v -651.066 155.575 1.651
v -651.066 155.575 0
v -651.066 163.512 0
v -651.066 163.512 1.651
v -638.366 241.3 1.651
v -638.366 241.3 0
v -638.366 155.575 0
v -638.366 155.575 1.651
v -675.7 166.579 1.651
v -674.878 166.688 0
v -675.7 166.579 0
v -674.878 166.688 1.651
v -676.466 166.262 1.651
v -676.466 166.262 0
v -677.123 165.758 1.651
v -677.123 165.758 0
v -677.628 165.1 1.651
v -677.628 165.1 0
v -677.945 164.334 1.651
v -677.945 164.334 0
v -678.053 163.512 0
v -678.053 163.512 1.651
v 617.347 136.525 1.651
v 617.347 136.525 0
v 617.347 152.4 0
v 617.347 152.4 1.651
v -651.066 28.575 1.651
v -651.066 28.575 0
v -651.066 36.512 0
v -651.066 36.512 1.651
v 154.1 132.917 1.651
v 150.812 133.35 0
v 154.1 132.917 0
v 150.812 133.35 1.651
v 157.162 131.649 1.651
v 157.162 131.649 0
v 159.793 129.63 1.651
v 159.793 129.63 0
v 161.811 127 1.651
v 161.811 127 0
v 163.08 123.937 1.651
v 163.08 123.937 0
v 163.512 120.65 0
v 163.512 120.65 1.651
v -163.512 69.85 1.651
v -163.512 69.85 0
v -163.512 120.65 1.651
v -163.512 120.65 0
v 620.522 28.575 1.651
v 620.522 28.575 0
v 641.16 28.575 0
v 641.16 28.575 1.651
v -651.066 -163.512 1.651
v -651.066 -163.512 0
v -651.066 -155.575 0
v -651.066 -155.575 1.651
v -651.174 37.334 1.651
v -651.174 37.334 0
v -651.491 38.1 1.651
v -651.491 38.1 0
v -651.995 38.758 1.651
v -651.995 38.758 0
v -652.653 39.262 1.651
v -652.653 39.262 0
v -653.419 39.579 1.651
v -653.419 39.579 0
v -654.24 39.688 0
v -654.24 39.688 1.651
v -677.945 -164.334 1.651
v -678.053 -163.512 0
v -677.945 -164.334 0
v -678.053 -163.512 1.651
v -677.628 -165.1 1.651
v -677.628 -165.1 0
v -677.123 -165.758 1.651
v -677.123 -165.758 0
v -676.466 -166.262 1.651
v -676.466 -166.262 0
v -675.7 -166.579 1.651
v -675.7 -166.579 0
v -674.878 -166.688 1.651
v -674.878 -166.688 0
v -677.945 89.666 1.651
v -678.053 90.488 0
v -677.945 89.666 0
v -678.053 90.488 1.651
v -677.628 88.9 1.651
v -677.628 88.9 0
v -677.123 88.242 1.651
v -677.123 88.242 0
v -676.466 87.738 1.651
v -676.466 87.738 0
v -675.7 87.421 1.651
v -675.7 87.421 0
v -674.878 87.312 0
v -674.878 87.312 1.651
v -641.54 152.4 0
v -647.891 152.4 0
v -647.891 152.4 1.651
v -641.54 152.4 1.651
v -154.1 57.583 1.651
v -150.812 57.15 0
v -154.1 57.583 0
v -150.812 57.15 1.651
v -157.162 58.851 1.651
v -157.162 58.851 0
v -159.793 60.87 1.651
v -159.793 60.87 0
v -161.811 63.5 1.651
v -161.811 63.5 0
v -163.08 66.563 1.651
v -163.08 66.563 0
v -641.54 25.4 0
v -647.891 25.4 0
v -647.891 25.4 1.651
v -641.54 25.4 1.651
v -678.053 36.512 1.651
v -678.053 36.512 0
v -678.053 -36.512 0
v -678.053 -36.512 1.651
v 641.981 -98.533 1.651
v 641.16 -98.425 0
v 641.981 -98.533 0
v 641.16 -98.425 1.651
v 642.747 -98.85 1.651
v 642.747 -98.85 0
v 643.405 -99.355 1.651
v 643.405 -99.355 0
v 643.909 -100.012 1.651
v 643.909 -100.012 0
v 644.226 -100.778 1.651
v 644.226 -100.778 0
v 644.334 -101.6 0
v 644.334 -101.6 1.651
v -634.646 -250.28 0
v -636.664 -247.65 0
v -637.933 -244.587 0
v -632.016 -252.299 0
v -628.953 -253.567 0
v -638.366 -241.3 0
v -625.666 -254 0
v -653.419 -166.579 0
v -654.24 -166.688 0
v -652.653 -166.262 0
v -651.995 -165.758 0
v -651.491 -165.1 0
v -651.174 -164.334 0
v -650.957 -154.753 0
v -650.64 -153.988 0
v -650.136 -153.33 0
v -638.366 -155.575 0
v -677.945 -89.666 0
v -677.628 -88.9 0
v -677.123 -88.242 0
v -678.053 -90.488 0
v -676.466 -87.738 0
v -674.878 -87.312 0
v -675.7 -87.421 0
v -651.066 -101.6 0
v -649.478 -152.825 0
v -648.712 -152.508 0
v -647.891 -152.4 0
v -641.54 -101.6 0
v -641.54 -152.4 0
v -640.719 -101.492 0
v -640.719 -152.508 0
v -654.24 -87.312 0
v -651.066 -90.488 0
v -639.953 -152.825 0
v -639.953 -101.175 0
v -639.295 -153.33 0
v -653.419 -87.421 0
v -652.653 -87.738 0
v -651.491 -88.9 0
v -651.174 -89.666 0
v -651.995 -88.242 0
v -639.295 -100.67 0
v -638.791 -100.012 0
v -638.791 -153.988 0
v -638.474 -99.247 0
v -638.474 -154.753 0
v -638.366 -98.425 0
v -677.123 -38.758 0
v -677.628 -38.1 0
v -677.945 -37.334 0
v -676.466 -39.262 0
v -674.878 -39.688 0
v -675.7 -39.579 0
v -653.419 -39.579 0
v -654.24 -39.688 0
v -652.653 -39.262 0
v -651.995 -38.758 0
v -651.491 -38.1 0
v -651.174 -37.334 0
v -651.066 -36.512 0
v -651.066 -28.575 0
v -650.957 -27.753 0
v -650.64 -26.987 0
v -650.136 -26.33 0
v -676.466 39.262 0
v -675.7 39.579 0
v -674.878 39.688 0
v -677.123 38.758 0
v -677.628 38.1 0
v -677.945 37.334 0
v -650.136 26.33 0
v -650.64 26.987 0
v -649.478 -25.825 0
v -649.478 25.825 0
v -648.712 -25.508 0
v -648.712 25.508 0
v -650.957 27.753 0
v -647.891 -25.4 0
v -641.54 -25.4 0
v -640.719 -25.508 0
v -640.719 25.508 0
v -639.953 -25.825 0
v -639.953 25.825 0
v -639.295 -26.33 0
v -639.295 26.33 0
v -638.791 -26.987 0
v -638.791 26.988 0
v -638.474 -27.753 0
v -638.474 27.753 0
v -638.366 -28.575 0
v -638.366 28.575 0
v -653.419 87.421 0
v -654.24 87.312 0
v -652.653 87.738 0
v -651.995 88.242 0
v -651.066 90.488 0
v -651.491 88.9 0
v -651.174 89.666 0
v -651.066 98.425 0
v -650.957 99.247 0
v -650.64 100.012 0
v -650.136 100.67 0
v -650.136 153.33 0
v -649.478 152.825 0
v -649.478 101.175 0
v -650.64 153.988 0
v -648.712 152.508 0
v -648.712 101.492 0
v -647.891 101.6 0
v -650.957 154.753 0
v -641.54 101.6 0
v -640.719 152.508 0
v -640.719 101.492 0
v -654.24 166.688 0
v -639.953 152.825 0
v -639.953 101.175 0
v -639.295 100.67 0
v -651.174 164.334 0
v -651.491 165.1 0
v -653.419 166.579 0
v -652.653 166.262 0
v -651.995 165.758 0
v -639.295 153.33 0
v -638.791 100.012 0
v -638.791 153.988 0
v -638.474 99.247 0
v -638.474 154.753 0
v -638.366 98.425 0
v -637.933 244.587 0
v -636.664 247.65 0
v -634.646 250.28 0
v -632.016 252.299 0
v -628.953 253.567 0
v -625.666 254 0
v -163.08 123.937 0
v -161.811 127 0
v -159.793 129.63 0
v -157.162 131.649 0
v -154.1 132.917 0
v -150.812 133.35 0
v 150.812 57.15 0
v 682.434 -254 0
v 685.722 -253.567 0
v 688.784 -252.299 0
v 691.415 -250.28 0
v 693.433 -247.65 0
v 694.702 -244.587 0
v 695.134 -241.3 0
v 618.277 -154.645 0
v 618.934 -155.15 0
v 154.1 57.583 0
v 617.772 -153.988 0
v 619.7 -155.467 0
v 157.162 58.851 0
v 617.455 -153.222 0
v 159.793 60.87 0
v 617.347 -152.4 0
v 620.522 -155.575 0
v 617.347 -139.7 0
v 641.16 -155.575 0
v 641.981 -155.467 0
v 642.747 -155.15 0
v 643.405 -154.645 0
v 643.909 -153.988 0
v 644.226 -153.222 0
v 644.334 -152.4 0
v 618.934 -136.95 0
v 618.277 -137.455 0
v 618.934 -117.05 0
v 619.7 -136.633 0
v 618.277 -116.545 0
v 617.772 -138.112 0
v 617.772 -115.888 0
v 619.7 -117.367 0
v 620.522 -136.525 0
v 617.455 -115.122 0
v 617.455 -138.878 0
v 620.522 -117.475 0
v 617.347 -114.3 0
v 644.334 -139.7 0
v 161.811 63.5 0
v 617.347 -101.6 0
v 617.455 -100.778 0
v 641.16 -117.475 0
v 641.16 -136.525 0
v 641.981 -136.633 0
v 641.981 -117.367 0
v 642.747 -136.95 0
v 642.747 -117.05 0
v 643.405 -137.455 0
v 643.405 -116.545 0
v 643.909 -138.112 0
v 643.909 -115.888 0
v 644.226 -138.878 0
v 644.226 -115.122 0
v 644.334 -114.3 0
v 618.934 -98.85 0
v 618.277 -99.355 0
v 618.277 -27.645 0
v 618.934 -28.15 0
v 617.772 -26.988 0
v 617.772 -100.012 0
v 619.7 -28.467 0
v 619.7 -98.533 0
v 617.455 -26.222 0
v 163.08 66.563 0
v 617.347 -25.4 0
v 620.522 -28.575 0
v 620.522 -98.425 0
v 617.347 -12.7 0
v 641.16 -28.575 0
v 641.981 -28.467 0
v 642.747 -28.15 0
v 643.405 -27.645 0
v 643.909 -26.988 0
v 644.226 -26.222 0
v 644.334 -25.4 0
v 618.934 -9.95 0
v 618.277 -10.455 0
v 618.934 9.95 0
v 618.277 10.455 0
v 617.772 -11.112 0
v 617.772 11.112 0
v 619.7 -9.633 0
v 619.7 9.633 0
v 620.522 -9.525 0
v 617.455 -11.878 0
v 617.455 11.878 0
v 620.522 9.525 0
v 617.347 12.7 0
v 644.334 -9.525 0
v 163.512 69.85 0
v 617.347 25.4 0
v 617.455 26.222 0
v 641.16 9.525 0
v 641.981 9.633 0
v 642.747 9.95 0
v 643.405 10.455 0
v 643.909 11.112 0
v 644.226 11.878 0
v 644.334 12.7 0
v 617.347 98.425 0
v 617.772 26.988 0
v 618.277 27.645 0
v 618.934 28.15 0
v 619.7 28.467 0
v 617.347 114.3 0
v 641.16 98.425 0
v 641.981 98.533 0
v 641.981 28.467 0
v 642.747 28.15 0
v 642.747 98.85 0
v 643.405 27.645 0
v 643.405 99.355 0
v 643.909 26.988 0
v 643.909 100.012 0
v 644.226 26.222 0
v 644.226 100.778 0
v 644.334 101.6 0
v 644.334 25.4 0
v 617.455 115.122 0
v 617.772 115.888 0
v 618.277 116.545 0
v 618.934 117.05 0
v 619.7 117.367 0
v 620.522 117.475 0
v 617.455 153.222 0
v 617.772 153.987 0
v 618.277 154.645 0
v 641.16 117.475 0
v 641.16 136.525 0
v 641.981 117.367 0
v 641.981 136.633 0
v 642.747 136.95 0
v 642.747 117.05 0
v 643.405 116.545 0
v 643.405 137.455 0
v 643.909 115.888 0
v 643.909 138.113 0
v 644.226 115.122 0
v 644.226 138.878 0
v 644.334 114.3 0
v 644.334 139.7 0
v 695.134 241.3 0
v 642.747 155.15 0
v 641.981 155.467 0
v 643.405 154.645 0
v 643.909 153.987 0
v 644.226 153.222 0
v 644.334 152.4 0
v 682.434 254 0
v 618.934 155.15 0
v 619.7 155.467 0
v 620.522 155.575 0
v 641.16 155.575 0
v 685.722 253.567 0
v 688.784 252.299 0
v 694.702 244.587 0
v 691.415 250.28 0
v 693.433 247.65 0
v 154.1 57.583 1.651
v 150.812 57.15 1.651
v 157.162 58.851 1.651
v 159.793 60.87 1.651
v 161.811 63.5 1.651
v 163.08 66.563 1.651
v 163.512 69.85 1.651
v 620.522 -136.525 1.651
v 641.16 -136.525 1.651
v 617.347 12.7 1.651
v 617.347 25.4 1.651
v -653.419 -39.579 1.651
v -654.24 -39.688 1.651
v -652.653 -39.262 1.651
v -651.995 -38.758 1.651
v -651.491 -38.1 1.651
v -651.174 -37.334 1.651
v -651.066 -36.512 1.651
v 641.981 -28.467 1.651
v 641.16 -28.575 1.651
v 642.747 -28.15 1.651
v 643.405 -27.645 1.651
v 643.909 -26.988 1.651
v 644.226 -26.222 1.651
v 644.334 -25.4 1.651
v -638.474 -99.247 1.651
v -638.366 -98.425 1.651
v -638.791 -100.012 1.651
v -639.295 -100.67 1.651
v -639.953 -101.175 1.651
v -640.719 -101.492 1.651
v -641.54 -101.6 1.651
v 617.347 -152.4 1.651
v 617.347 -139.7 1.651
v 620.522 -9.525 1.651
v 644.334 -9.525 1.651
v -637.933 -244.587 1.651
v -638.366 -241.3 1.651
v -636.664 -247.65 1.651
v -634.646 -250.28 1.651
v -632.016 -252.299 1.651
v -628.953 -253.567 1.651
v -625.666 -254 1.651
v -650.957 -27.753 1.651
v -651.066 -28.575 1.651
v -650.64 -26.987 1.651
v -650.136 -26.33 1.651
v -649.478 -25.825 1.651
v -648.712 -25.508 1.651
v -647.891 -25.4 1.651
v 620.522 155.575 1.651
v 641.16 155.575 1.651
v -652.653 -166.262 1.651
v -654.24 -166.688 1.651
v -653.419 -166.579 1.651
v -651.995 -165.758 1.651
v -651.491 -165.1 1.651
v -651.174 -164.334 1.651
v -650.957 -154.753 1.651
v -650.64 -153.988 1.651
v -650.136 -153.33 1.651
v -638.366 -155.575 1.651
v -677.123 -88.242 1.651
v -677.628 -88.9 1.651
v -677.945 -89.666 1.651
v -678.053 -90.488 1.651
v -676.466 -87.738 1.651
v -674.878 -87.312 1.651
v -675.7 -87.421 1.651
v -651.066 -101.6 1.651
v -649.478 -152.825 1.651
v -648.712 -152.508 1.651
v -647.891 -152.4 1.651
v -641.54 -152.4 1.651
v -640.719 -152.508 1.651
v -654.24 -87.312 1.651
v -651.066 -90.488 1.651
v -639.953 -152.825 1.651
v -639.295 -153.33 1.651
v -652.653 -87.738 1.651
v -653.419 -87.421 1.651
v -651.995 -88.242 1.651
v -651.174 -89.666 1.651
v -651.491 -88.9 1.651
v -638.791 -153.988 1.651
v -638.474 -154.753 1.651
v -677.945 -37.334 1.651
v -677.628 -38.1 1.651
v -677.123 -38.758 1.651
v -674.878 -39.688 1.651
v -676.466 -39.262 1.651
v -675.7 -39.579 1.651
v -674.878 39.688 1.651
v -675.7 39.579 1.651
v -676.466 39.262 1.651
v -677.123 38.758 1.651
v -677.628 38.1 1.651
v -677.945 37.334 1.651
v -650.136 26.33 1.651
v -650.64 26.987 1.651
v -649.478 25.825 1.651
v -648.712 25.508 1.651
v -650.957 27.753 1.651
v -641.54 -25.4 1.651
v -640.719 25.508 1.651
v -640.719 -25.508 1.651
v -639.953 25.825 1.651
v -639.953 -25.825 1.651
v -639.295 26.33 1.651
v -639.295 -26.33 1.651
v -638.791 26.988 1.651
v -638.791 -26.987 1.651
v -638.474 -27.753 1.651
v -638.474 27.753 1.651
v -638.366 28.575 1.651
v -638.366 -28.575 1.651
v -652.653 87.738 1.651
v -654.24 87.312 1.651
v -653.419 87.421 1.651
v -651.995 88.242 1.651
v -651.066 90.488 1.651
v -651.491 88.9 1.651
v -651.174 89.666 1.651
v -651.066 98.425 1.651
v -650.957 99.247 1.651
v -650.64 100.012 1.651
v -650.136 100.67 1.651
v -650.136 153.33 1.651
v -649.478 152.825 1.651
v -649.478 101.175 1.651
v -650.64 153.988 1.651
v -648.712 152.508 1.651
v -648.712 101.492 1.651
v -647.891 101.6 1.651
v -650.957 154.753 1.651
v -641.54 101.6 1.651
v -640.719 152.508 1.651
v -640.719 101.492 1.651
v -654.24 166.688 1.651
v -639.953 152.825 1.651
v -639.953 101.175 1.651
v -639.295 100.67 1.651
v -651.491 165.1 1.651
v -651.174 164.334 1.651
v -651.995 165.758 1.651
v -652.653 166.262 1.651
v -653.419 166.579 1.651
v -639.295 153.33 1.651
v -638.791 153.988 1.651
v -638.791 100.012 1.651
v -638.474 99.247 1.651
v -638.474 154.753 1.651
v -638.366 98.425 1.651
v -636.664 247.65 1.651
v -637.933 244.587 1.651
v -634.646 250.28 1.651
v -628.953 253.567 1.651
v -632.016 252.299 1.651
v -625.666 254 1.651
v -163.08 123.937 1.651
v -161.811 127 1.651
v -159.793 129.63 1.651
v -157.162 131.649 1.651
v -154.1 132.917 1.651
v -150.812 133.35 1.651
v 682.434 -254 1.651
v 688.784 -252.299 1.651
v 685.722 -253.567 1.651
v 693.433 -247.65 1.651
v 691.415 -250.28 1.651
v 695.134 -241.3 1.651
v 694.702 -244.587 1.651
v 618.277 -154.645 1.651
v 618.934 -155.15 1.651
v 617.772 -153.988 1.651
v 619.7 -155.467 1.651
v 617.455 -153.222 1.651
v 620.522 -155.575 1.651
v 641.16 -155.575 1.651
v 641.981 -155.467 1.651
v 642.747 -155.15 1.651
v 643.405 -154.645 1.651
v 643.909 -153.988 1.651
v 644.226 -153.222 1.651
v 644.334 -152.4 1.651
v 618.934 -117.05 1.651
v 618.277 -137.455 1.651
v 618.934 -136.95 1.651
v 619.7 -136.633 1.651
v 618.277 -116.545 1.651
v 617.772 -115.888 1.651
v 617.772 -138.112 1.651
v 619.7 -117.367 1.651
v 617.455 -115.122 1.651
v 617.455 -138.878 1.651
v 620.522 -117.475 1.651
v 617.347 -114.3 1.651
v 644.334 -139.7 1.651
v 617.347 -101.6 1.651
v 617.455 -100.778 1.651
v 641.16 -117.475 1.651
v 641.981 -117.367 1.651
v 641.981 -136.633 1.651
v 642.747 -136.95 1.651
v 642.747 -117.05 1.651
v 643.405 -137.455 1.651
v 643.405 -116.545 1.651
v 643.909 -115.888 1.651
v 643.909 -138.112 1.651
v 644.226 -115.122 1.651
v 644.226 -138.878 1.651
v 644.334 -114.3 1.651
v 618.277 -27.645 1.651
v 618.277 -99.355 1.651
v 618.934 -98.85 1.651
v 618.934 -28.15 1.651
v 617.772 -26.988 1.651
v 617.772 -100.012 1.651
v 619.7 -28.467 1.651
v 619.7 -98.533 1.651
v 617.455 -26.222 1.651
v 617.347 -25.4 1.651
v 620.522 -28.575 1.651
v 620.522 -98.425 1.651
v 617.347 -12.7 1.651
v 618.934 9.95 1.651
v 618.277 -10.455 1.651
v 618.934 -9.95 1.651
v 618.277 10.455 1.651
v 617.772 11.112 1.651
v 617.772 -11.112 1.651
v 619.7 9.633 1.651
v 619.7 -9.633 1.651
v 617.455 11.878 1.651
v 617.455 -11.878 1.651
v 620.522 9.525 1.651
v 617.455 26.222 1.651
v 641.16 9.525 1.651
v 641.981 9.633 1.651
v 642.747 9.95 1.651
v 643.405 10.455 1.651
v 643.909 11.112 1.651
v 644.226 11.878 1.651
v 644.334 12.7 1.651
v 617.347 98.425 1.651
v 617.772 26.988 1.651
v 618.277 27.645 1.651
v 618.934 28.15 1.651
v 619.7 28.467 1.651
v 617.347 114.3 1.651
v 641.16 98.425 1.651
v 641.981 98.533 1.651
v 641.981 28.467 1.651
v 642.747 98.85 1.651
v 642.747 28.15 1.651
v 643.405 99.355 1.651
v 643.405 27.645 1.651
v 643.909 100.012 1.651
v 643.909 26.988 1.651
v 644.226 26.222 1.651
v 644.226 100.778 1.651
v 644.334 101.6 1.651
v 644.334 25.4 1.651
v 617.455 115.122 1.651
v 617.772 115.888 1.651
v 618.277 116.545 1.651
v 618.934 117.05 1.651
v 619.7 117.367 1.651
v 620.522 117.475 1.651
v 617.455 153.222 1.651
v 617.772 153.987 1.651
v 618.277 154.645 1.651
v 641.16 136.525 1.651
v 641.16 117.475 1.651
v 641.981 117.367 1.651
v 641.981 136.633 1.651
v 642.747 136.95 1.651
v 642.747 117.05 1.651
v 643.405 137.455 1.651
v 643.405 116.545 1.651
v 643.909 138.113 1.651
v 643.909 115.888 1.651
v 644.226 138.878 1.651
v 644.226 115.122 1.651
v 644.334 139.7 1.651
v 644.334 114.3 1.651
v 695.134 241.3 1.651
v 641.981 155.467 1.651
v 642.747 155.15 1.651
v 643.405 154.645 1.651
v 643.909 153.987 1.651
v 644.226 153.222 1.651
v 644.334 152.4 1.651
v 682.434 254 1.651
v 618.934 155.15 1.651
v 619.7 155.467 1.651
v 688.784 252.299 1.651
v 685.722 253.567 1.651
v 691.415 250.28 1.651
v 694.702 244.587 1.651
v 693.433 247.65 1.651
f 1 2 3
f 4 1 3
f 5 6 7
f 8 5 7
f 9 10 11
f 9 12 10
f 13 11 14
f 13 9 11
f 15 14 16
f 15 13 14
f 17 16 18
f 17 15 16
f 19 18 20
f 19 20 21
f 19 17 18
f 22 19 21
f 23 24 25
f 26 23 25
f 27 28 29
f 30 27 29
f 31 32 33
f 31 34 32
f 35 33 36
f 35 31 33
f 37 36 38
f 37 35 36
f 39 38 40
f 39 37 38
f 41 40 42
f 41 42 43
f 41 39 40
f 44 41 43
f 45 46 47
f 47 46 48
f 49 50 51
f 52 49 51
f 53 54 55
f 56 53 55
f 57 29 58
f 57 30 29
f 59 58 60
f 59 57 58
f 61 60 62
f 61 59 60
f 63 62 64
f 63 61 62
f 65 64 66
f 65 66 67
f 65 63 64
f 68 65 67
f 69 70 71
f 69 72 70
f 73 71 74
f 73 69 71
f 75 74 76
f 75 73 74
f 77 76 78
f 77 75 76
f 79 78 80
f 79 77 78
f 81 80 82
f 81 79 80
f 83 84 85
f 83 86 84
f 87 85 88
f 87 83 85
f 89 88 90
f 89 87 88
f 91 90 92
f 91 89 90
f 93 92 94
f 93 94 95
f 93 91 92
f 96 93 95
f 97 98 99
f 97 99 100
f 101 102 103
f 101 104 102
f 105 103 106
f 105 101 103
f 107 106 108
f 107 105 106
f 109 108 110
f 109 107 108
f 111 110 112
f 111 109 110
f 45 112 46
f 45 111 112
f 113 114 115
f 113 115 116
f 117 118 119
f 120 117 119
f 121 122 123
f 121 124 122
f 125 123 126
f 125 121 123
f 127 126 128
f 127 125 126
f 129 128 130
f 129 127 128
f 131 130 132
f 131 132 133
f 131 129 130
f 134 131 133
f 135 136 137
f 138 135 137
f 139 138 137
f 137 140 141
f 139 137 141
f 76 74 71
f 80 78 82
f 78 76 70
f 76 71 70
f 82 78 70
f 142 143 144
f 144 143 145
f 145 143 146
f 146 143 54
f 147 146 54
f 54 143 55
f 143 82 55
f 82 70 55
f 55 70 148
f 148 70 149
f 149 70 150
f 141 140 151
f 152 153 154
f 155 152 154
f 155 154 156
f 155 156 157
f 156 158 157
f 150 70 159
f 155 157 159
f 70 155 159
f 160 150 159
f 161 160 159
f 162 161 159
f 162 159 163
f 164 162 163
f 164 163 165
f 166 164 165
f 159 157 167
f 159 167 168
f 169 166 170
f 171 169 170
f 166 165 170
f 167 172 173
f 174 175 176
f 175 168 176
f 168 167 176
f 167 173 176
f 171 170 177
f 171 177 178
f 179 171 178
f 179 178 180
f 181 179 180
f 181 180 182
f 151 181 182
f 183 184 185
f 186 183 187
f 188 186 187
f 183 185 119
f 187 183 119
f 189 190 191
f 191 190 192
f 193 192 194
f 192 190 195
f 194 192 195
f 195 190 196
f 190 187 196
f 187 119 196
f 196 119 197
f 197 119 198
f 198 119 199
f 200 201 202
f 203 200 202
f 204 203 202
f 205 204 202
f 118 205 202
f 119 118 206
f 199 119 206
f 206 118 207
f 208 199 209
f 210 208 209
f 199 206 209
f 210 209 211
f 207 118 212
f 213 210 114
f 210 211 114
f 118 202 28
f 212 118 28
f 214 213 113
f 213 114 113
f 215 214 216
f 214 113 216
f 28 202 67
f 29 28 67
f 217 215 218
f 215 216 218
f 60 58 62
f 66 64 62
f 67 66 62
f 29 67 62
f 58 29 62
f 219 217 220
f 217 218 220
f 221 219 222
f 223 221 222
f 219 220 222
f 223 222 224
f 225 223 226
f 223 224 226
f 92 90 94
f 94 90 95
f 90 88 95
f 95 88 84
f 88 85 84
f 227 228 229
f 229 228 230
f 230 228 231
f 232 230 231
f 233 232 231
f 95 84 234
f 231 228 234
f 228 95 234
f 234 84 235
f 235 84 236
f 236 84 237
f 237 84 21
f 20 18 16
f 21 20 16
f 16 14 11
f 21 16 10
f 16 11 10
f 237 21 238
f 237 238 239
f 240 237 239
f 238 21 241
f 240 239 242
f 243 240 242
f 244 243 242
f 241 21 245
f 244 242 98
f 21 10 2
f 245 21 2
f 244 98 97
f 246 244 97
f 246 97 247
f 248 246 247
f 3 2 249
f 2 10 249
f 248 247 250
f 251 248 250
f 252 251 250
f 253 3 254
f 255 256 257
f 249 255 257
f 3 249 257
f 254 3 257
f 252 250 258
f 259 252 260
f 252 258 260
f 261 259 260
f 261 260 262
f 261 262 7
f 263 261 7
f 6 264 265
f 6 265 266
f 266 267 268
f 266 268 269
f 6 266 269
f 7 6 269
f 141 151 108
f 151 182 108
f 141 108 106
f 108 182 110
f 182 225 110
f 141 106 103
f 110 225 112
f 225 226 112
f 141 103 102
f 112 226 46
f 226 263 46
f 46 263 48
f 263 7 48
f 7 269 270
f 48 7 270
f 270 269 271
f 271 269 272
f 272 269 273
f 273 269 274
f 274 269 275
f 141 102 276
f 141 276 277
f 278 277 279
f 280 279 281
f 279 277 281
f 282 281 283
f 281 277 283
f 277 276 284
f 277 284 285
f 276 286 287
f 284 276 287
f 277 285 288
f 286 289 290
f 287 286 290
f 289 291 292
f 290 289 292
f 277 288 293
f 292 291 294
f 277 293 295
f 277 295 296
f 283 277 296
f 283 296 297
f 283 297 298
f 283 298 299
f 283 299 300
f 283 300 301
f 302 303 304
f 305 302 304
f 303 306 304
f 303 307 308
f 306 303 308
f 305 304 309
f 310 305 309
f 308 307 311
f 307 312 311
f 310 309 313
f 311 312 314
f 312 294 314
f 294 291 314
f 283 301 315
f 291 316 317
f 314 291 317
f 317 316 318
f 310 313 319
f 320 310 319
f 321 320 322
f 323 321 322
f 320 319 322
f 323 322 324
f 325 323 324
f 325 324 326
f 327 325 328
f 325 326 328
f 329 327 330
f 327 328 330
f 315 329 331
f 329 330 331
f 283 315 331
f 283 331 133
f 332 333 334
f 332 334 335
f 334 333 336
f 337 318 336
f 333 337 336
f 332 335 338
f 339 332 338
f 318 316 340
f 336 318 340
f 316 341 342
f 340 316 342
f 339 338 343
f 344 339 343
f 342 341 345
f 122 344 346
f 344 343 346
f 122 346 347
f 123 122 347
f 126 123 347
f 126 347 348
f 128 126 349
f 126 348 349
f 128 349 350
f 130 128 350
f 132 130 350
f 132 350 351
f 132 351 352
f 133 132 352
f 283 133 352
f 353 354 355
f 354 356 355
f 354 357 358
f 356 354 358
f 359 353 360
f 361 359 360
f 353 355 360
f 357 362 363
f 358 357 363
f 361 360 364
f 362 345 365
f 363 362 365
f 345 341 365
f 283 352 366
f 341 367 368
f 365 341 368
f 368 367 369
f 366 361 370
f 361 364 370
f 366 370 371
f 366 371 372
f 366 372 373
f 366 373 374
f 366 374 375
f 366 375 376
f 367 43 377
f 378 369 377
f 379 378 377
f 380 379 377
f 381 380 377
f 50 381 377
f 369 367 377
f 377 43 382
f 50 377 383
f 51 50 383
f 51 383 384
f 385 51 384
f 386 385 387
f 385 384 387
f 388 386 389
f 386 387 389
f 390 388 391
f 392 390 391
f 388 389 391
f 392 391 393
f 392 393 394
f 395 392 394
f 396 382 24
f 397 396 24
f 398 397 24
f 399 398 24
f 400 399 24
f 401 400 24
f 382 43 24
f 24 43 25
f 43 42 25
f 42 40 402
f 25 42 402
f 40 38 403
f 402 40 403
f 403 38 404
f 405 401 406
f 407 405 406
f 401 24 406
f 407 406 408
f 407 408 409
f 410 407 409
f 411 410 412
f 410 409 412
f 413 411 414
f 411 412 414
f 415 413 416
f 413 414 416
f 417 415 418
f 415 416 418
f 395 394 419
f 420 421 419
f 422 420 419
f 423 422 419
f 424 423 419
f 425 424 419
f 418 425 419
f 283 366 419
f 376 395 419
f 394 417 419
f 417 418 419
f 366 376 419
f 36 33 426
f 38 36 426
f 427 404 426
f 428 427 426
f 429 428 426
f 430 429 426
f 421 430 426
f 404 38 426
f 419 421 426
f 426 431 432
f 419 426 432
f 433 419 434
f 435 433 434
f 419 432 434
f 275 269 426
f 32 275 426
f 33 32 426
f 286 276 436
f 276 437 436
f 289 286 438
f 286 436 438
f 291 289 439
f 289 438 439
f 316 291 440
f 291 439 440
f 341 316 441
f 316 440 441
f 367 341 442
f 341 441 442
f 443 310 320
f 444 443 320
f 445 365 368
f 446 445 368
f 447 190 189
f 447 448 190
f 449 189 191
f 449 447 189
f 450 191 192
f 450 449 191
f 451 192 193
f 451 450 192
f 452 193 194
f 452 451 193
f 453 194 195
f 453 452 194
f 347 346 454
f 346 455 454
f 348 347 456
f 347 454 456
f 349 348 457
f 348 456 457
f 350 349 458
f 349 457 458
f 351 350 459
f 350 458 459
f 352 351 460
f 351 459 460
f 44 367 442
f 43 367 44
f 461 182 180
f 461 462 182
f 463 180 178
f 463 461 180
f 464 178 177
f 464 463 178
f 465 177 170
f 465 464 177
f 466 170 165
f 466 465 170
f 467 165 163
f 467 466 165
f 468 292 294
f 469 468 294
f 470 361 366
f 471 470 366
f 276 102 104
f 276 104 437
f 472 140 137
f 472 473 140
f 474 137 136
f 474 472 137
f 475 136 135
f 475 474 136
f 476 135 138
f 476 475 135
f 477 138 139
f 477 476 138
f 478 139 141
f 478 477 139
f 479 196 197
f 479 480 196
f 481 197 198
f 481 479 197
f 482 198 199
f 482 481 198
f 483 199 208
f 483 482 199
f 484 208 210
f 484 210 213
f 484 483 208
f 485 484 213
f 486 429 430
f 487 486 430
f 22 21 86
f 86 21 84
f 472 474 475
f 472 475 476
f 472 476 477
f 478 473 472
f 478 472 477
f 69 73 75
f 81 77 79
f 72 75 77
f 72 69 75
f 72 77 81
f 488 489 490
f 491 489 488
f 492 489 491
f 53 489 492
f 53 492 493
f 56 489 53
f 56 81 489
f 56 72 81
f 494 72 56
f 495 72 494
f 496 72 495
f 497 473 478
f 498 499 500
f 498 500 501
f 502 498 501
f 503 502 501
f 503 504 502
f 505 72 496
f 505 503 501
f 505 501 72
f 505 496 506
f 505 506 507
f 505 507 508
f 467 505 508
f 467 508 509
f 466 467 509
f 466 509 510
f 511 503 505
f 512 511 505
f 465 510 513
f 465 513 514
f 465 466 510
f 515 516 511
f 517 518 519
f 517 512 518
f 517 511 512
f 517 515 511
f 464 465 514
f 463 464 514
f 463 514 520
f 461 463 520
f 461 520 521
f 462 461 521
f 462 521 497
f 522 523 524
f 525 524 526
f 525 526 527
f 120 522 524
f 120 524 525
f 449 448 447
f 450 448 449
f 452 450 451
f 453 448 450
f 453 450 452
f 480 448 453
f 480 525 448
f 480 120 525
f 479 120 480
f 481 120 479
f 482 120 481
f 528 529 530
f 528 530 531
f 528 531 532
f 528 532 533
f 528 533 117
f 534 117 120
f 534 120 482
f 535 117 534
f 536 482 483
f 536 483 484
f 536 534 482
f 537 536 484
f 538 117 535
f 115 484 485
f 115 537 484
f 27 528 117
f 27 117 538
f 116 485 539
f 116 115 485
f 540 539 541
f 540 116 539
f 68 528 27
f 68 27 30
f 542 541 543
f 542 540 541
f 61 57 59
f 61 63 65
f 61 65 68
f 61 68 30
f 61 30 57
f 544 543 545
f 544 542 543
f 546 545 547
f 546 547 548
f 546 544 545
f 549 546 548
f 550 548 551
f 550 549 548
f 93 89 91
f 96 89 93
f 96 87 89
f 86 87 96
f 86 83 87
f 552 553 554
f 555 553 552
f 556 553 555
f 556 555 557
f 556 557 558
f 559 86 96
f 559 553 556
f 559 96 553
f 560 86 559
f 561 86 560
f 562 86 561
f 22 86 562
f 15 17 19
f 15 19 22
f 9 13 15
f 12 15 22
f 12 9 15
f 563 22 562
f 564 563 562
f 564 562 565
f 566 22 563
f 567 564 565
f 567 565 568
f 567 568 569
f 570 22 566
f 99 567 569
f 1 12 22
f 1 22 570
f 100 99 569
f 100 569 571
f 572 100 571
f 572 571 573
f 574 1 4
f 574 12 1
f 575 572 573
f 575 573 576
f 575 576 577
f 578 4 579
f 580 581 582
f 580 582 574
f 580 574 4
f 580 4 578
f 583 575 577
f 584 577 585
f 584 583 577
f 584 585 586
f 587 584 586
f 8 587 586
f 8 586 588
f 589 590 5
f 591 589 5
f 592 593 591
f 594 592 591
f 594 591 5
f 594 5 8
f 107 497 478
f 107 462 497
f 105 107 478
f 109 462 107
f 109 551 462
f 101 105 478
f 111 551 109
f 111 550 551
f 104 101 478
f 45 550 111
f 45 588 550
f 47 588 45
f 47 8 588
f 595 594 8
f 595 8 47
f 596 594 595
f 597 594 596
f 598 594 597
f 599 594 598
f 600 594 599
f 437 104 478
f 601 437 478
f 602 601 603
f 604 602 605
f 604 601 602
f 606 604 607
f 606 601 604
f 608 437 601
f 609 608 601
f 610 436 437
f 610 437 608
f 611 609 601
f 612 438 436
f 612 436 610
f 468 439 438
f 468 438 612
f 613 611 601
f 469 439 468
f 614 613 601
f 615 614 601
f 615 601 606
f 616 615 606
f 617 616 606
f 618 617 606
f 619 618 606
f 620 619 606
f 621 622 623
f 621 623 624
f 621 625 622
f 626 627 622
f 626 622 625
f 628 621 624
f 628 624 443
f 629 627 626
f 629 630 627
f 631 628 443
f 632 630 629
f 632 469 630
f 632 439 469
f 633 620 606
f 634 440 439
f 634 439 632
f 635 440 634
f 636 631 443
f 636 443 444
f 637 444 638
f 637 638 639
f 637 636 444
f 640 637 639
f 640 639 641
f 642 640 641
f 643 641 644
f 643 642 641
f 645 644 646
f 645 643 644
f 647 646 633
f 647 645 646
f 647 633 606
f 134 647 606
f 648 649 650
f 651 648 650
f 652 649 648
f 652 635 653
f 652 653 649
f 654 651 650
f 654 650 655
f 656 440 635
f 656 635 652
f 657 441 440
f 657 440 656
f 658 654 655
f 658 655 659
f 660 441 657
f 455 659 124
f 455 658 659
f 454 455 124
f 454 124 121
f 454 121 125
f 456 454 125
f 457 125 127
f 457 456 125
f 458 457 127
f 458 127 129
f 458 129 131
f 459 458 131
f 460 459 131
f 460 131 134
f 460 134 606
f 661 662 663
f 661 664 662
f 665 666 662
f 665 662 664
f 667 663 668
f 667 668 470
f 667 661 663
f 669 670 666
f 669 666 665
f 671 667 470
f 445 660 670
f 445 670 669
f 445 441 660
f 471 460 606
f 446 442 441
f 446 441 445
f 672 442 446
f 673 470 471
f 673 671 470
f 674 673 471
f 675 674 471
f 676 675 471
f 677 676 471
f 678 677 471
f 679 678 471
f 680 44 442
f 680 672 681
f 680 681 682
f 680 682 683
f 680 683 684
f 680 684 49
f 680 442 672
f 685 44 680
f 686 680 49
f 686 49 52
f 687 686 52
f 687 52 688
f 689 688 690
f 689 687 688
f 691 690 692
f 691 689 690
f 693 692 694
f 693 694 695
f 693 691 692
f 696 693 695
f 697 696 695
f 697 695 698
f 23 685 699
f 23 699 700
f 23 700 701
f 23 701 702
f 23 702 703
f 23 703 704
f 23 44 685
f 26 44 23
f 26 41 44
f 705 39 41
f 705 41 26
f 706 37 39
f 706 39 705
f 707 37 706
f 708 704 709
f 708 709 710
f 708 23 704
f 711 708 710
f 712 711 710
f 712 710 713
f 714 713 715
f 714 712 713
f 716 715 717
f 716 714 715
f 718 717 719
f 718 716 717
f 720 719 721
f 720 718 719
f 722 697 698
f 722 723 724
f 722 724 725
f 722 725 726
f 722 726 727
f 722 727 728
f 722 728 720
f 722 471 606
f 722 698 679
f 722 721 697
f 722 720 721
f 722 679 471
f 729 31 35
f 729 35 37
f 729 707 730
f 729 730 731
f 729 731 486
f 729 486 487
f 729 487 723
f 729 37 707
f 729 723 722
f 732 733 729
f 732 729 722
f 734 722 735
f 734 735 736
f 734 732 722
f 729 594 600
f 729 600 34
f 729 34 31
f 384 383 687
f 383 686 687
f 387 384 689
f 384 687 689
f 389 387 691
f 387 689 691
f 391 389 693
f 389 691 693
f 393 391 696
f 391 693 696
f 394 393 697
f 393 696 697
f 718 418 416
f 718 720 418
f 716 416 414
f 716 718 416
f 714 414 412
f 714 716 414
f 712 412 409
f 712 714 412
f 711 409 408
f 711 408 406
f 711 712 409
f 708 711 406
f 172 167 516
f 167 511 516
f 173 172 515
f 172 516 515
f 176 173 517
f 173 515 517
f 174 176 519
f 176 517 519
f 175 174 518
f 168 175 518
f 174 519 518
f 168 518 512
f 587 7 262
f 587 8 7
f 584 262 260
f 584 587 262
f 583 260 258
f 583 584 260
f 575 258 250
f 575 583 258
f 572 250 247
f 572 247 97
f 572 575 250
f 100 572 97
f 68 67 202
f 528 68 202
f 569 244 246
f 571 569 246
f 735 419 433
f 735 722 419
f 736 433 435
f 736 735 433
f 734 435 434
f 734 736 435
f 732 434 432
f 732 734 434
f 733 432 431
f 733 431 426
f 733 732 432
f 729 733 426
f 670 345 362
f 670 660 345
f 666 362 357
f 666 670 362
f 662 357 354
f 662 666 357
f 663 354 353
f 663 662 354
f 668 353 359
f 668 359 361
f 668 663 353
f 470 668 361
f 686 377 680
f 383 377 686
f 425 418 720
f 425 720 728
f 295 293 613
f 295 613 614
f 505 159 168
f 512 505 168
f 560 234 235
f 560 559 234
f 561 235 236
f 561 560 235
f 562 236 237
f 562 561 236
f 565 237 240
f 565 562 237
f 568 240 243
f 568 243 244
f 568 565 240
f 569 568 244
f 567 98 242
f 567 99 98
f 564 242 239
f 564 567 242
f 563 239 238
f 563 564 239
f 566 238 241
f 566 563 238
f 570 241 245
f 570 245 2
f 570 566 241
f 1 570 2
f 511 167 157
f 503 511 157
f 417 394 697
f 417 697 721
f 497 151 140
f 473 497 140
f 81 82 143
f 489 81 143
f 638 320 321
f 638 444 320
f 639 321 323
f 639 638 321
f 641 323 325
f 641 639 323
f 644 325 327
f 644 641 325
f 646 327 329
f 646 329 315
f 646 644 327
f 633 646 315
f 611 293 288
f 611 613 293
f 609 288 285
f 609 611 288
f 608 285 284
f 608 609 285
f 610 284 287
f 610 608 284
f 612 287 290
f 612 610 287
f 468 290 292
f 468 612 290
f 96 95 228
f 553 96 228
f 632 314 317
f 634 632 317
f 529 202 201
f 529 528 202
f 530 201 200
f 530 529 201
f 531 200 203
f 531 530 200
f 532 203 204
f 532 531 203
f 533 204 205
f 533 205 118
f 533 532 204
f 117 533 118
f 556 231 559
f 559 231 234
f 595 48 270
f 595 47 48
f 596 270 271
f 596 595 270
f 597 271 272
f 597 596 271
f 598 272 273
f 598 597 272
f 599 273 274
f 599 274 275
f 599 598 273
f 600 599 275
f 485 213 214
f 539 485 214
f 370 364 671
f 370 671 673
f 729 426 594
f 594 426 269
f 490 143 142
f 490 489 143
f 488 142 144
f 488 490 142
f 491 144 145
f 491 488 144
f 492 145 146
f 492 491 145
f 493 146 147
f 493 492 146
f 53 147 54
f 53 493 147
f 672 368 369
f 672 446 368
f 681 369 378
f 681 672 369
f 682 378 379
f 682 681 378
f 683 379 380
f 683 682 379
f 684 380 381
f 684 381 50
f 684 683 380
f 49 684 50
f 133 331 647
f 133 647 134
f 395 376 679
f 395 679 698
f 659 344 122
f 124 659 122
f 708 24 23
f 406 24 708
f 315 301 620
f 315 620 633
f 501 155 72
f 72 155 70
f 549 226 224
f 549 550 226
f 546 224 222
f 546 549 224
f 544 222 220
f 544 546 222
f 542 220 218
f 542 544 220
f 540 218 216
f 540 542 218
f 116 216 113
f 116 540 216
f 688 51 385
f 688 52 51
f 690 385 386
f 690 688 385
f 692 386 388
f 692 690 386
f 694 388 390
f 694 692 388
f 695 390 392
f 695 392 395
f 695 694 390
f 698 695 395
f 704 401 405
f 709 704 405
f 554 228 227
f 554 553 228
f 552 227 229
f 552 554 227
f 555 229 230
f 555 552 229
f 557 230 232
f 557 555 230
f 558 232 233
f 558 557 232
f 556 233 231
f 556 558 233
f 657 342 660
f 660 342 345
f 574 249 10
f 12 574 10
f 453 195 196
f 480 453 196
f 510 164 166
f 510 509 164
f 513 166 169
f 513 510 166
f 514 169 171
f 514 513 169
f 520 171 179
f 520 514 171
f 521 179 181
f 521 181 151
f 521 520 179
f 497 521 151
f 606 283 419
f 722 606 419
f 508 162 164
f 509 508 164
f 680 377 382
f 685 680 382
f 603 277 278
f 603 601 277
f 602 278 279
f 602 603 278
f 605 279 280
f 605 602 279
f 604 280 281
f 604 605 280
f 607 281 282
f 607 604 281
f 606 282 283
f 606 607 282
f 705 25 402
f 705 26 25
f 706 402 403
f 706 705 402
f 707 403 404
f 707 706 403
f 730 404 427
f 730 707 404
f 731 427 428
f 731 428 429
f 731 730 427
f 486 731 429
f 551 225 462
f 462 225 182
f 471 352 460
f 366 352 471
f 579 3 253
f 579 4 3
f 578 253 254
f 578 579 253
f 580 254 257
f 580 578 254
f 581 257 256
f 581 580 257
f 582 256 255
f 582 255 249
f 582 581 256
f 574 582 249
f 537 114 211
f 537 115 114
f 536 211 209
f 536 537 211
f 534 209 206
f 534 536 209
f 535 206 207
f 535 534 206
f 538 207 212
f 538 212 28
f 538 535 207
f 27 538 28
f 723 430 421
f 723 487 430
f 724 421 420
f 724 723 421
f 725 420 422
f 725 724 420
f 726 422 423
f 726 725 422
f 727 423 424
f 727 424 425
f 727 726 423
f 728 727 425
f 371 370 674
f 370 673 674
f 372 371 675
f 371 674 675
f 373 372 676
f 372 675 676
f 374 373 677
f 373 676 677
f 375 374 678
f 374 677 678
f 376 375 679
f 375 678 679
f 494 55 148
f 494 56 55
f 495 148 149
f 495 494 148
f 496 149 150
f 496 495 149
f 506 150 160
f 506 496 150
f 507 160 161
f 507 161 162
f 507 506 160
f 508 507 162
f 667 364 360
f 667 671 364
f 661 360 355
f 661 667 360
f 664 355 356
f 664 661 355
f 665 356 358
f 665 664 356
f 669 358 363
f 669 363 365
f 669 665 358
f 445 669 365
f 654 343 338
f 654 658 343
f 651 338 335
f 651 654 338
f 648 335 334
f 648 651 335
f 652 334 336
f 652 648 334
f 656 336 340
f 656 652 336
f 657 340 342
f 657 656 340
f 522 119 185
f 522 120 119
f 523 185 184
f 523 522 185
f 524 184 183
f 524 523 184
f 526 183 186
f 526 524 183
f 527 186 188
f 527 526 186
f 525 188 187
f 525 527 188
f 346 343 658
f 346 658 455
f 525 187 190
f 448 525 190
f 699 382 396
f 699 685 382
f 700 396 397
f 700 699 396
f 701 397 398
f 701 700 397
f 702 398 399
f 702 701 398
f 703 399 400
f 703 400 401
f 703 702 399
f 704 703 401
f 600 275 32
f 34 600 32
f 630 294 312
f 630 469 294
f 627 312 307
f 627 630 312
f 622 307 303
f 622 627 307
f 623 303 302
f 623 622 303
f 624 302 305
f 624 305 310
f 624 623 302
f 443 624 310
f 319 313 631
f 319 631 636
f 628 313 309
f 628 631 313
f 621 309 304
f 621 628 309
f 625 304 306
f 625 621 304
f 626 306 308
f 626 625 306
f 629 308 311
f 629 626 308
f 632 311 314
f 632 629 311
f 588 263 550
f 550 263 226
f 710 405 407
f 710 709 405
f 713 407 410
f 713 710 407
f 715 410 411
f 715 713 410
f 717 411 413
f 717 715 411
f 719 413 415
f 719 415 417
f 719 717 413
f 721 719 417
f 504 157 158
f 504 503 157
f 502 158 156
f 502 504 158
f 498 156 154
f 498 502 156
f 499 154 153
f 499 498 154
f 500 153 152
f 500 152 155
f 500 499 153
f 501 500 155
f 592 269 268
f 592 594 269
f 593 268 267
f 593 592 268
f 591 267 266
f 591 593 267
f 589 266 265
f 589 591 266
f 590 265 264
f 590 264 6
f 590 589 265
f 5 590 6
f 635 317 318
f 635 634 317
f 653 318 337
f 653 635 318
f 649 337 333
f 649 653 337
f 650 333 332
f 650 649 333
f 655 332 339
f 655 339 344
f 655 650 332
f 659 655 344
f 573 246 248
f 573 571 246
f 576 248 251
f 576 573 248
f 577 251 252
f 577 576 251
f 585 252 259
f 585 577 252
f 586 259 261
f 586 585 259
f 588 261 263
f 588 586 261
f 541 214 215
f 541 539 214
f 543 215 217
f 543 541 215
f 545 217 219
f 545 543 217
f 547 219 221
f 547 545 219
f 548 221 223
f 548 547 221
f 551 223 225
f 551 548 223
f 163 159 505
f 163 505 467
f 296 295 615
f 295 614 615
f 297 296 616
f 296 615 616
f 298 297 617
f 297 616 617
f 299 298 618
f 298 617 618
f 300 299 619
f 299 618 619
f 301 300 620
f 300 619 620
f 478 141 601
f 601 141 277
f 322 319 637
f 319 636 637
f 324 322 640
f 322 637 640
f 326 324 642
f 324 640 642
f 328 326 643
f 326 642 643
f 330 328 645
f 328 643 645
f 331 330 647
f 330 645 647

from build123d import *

# Parameters (mm, degrees)
F0_W     = 26.9875
F0_H     = 19.05
F0_W_2   = 327.025
F0_H_2   = 76.2
F0_W_3   = 12.7
F0_H_3   = 50.8
F1_DEPTH = 1.651
F2_R     = 12.7
F3_R     = 3.175
F4_R     = 12.7


with BuildPart() as f1:
    # F0 (on Top) → F1 (new body)
    with BuildSketch(Plane.XY):
        Polygon((-651.0655, -152.4), (-651.0655, -101.6), (-651.0655, -87.3125), (-678.053, -87.3125), (-678.053, -166.6875), (-651.0655, -166.6875), align=None)
        Polygon((638.3655, 254), (-638.3655, 254), (-638.3655, 152.4), (-638.3655, 101.6), (-638.3655, 25.4), (-638.3655, -25.4), (-638.3655, -101.6), (-638.3655, -152.4), (-638.3655, -254), (638.3655, -254), (695.1345, -254), (695.1345, 254), align=None)
        with Locations((630.84075, -146.05)):
            Rectangle(F0_W, F0_H, mode=Mode.SUBTRACT)
        with Locations((630.84075, -107.95)):
            Rectangle(F0_W, F0_H, mode=Mode.SUBTRACT)
        with Locations((630.84075, -19.05)):
            Rectangle(F0_W, F0_H, mode=Mode.SUBTRACT)
        with Locations((0, 95.25)):
            Rectangle(F0_W_2, F0_H_2, mode=Mode.SUBTRACT)
        with Locations((630.84075, 19.05)):
            Rectangle(F0_W, F0_H, mode=Mode.SUBTRACT)
        with Locations((630.84075, 107.95)):
            Rectangle(F0_W, F0_H, mode=Mode.SUBTRACT)
        with Locations((630.84075, 146.05)):
            Rectangle(F0_W, F0_H, mode=Mode.SUBTRACT)
        with Locations((-644.7155, -127)):
            Rectangle(F0_W_3, F0_H_3)
        Polygon((-651.0655, 101.6), (-651.0655, 152.4), (-651.0655, 166.6875), (-678.053, 166.6875), (-678.053, 87.3125), (-651.0655, 87.3125), align=None)
        with Locations((-644.7155, 0)):
            Rectangle(F0_W_3, F0_H_3)
        Polygon((-651.0655, -25.4), (-651.0655, 25.4), (-651.0655, 39.6875), (-678.053, 39.6875), (-678.053, -39.6875), (-651.0655, -39.6875), align=None)
        with Locations((-644.7155, 127)):
            Rectangle(F0_W_3, F0_H_3)
    extrude(amount=F1_DEPTH)

    # F2
    f2_edges = [f1.edges().sort_by_distance(p)[0] for p in [
        (-163.5125, 133.35, 0.8255),
        (163.5125, 133.35, 0.8255),
        (-163.5125, 57.15, 0.8255),
        (163.5125, 57.15, 0.8255),
    ]]
    fillet(f2_edges, radius=F2_R)

    # F3
    f3_edges = [f1.edges().sort_by_distance(p)[0] for p in [
        (-678.053, 166.6875, 0.8255),
        (-651.0655, 166.6875, 0.8255),
        (-638.3655, 152.4, 0.8255),
        (-651.0655, 152.4, 0.8255),
        (-651.0655, 87.3125, 0.8255),
        (-651.0655, 101.6, 0.8255),
        (-678.053, 87.3125, 0.8255),
        (-638.3655, 101.6, 0.8255),
        (-638.3655, -25.4, 0.8255),
        (-638.3655, 25.4, 0.8255),
        (-651.0655, 39.6875, 0.8255),
        (-651.0655, 25.4, 0.8255),
        (-678.053, 39.6875, 0.8255),
        (-678.053, -39.6875, 0.8255),
        (-651.0655, -39.6875, 0.8255),
        (-651.0655, -25.4, 0.8255),
        (-638.3655, -101.6, 0.8255),
        (-651.0655, -87.3125, 0.8255),
        (-678.053, -87.3125, 0.8255),
        (-678.053, -166.6875, 0.8255),
        (-651.0655, -166.6875, 0.8255),
        (-638.3655, -152.4, 0.8255),
        (-651.0655, -152.4, 0.8255),
        (617.347, 155.575, 0.8255),
        (617.347, 117.475, 0.8255),
        (617.347, 28.575, 0.8255),
        (617.347, -136.525, 0.8255),
        (617.347, -98.425, 0.8255),
        (617.347, -9.525, 0.8255),
        (617.347, 9.525, 0.8255),
        (617.347, -28.575, 0.8255),
        (617.347, -117.475, 0.8255),
        (617.347, -155.575, 0.8255),
        (644.3345, -155.575, 0.8255),
        (644.3345, -136.525, 0.8255),
        (644.3345, -98.425, 0.8255),
        (644.3345, 155.575, 0.8255),
        (644.3345, 117.475, 0.8255),
        (644.3345, 98.425, 0.8255),
        (644.3345, 9.525, 0.8255),
        (644.3345, 136.525, 0.8255),
        (644.3345, -28.575, 0.8255),
        (644.3345, 28.575, 0.8255),
        (644.3345, -117.475, 0.8255),
    ]]
    fillet(f3_edges, radius=F3_R)

    # F4
    f4_edges = [f1.edges().sort_by_distance(p)[0] for p in [
        (695.1345, 254, 0.8255),
        (695.1345, -254, 0.8255),
        (-638.3655, -254, 0.8255),
        (-638.3655, 254, 0.8255),
    ]]
    fillet(f4_edges, radius=F4_R)


solid = f1.part
